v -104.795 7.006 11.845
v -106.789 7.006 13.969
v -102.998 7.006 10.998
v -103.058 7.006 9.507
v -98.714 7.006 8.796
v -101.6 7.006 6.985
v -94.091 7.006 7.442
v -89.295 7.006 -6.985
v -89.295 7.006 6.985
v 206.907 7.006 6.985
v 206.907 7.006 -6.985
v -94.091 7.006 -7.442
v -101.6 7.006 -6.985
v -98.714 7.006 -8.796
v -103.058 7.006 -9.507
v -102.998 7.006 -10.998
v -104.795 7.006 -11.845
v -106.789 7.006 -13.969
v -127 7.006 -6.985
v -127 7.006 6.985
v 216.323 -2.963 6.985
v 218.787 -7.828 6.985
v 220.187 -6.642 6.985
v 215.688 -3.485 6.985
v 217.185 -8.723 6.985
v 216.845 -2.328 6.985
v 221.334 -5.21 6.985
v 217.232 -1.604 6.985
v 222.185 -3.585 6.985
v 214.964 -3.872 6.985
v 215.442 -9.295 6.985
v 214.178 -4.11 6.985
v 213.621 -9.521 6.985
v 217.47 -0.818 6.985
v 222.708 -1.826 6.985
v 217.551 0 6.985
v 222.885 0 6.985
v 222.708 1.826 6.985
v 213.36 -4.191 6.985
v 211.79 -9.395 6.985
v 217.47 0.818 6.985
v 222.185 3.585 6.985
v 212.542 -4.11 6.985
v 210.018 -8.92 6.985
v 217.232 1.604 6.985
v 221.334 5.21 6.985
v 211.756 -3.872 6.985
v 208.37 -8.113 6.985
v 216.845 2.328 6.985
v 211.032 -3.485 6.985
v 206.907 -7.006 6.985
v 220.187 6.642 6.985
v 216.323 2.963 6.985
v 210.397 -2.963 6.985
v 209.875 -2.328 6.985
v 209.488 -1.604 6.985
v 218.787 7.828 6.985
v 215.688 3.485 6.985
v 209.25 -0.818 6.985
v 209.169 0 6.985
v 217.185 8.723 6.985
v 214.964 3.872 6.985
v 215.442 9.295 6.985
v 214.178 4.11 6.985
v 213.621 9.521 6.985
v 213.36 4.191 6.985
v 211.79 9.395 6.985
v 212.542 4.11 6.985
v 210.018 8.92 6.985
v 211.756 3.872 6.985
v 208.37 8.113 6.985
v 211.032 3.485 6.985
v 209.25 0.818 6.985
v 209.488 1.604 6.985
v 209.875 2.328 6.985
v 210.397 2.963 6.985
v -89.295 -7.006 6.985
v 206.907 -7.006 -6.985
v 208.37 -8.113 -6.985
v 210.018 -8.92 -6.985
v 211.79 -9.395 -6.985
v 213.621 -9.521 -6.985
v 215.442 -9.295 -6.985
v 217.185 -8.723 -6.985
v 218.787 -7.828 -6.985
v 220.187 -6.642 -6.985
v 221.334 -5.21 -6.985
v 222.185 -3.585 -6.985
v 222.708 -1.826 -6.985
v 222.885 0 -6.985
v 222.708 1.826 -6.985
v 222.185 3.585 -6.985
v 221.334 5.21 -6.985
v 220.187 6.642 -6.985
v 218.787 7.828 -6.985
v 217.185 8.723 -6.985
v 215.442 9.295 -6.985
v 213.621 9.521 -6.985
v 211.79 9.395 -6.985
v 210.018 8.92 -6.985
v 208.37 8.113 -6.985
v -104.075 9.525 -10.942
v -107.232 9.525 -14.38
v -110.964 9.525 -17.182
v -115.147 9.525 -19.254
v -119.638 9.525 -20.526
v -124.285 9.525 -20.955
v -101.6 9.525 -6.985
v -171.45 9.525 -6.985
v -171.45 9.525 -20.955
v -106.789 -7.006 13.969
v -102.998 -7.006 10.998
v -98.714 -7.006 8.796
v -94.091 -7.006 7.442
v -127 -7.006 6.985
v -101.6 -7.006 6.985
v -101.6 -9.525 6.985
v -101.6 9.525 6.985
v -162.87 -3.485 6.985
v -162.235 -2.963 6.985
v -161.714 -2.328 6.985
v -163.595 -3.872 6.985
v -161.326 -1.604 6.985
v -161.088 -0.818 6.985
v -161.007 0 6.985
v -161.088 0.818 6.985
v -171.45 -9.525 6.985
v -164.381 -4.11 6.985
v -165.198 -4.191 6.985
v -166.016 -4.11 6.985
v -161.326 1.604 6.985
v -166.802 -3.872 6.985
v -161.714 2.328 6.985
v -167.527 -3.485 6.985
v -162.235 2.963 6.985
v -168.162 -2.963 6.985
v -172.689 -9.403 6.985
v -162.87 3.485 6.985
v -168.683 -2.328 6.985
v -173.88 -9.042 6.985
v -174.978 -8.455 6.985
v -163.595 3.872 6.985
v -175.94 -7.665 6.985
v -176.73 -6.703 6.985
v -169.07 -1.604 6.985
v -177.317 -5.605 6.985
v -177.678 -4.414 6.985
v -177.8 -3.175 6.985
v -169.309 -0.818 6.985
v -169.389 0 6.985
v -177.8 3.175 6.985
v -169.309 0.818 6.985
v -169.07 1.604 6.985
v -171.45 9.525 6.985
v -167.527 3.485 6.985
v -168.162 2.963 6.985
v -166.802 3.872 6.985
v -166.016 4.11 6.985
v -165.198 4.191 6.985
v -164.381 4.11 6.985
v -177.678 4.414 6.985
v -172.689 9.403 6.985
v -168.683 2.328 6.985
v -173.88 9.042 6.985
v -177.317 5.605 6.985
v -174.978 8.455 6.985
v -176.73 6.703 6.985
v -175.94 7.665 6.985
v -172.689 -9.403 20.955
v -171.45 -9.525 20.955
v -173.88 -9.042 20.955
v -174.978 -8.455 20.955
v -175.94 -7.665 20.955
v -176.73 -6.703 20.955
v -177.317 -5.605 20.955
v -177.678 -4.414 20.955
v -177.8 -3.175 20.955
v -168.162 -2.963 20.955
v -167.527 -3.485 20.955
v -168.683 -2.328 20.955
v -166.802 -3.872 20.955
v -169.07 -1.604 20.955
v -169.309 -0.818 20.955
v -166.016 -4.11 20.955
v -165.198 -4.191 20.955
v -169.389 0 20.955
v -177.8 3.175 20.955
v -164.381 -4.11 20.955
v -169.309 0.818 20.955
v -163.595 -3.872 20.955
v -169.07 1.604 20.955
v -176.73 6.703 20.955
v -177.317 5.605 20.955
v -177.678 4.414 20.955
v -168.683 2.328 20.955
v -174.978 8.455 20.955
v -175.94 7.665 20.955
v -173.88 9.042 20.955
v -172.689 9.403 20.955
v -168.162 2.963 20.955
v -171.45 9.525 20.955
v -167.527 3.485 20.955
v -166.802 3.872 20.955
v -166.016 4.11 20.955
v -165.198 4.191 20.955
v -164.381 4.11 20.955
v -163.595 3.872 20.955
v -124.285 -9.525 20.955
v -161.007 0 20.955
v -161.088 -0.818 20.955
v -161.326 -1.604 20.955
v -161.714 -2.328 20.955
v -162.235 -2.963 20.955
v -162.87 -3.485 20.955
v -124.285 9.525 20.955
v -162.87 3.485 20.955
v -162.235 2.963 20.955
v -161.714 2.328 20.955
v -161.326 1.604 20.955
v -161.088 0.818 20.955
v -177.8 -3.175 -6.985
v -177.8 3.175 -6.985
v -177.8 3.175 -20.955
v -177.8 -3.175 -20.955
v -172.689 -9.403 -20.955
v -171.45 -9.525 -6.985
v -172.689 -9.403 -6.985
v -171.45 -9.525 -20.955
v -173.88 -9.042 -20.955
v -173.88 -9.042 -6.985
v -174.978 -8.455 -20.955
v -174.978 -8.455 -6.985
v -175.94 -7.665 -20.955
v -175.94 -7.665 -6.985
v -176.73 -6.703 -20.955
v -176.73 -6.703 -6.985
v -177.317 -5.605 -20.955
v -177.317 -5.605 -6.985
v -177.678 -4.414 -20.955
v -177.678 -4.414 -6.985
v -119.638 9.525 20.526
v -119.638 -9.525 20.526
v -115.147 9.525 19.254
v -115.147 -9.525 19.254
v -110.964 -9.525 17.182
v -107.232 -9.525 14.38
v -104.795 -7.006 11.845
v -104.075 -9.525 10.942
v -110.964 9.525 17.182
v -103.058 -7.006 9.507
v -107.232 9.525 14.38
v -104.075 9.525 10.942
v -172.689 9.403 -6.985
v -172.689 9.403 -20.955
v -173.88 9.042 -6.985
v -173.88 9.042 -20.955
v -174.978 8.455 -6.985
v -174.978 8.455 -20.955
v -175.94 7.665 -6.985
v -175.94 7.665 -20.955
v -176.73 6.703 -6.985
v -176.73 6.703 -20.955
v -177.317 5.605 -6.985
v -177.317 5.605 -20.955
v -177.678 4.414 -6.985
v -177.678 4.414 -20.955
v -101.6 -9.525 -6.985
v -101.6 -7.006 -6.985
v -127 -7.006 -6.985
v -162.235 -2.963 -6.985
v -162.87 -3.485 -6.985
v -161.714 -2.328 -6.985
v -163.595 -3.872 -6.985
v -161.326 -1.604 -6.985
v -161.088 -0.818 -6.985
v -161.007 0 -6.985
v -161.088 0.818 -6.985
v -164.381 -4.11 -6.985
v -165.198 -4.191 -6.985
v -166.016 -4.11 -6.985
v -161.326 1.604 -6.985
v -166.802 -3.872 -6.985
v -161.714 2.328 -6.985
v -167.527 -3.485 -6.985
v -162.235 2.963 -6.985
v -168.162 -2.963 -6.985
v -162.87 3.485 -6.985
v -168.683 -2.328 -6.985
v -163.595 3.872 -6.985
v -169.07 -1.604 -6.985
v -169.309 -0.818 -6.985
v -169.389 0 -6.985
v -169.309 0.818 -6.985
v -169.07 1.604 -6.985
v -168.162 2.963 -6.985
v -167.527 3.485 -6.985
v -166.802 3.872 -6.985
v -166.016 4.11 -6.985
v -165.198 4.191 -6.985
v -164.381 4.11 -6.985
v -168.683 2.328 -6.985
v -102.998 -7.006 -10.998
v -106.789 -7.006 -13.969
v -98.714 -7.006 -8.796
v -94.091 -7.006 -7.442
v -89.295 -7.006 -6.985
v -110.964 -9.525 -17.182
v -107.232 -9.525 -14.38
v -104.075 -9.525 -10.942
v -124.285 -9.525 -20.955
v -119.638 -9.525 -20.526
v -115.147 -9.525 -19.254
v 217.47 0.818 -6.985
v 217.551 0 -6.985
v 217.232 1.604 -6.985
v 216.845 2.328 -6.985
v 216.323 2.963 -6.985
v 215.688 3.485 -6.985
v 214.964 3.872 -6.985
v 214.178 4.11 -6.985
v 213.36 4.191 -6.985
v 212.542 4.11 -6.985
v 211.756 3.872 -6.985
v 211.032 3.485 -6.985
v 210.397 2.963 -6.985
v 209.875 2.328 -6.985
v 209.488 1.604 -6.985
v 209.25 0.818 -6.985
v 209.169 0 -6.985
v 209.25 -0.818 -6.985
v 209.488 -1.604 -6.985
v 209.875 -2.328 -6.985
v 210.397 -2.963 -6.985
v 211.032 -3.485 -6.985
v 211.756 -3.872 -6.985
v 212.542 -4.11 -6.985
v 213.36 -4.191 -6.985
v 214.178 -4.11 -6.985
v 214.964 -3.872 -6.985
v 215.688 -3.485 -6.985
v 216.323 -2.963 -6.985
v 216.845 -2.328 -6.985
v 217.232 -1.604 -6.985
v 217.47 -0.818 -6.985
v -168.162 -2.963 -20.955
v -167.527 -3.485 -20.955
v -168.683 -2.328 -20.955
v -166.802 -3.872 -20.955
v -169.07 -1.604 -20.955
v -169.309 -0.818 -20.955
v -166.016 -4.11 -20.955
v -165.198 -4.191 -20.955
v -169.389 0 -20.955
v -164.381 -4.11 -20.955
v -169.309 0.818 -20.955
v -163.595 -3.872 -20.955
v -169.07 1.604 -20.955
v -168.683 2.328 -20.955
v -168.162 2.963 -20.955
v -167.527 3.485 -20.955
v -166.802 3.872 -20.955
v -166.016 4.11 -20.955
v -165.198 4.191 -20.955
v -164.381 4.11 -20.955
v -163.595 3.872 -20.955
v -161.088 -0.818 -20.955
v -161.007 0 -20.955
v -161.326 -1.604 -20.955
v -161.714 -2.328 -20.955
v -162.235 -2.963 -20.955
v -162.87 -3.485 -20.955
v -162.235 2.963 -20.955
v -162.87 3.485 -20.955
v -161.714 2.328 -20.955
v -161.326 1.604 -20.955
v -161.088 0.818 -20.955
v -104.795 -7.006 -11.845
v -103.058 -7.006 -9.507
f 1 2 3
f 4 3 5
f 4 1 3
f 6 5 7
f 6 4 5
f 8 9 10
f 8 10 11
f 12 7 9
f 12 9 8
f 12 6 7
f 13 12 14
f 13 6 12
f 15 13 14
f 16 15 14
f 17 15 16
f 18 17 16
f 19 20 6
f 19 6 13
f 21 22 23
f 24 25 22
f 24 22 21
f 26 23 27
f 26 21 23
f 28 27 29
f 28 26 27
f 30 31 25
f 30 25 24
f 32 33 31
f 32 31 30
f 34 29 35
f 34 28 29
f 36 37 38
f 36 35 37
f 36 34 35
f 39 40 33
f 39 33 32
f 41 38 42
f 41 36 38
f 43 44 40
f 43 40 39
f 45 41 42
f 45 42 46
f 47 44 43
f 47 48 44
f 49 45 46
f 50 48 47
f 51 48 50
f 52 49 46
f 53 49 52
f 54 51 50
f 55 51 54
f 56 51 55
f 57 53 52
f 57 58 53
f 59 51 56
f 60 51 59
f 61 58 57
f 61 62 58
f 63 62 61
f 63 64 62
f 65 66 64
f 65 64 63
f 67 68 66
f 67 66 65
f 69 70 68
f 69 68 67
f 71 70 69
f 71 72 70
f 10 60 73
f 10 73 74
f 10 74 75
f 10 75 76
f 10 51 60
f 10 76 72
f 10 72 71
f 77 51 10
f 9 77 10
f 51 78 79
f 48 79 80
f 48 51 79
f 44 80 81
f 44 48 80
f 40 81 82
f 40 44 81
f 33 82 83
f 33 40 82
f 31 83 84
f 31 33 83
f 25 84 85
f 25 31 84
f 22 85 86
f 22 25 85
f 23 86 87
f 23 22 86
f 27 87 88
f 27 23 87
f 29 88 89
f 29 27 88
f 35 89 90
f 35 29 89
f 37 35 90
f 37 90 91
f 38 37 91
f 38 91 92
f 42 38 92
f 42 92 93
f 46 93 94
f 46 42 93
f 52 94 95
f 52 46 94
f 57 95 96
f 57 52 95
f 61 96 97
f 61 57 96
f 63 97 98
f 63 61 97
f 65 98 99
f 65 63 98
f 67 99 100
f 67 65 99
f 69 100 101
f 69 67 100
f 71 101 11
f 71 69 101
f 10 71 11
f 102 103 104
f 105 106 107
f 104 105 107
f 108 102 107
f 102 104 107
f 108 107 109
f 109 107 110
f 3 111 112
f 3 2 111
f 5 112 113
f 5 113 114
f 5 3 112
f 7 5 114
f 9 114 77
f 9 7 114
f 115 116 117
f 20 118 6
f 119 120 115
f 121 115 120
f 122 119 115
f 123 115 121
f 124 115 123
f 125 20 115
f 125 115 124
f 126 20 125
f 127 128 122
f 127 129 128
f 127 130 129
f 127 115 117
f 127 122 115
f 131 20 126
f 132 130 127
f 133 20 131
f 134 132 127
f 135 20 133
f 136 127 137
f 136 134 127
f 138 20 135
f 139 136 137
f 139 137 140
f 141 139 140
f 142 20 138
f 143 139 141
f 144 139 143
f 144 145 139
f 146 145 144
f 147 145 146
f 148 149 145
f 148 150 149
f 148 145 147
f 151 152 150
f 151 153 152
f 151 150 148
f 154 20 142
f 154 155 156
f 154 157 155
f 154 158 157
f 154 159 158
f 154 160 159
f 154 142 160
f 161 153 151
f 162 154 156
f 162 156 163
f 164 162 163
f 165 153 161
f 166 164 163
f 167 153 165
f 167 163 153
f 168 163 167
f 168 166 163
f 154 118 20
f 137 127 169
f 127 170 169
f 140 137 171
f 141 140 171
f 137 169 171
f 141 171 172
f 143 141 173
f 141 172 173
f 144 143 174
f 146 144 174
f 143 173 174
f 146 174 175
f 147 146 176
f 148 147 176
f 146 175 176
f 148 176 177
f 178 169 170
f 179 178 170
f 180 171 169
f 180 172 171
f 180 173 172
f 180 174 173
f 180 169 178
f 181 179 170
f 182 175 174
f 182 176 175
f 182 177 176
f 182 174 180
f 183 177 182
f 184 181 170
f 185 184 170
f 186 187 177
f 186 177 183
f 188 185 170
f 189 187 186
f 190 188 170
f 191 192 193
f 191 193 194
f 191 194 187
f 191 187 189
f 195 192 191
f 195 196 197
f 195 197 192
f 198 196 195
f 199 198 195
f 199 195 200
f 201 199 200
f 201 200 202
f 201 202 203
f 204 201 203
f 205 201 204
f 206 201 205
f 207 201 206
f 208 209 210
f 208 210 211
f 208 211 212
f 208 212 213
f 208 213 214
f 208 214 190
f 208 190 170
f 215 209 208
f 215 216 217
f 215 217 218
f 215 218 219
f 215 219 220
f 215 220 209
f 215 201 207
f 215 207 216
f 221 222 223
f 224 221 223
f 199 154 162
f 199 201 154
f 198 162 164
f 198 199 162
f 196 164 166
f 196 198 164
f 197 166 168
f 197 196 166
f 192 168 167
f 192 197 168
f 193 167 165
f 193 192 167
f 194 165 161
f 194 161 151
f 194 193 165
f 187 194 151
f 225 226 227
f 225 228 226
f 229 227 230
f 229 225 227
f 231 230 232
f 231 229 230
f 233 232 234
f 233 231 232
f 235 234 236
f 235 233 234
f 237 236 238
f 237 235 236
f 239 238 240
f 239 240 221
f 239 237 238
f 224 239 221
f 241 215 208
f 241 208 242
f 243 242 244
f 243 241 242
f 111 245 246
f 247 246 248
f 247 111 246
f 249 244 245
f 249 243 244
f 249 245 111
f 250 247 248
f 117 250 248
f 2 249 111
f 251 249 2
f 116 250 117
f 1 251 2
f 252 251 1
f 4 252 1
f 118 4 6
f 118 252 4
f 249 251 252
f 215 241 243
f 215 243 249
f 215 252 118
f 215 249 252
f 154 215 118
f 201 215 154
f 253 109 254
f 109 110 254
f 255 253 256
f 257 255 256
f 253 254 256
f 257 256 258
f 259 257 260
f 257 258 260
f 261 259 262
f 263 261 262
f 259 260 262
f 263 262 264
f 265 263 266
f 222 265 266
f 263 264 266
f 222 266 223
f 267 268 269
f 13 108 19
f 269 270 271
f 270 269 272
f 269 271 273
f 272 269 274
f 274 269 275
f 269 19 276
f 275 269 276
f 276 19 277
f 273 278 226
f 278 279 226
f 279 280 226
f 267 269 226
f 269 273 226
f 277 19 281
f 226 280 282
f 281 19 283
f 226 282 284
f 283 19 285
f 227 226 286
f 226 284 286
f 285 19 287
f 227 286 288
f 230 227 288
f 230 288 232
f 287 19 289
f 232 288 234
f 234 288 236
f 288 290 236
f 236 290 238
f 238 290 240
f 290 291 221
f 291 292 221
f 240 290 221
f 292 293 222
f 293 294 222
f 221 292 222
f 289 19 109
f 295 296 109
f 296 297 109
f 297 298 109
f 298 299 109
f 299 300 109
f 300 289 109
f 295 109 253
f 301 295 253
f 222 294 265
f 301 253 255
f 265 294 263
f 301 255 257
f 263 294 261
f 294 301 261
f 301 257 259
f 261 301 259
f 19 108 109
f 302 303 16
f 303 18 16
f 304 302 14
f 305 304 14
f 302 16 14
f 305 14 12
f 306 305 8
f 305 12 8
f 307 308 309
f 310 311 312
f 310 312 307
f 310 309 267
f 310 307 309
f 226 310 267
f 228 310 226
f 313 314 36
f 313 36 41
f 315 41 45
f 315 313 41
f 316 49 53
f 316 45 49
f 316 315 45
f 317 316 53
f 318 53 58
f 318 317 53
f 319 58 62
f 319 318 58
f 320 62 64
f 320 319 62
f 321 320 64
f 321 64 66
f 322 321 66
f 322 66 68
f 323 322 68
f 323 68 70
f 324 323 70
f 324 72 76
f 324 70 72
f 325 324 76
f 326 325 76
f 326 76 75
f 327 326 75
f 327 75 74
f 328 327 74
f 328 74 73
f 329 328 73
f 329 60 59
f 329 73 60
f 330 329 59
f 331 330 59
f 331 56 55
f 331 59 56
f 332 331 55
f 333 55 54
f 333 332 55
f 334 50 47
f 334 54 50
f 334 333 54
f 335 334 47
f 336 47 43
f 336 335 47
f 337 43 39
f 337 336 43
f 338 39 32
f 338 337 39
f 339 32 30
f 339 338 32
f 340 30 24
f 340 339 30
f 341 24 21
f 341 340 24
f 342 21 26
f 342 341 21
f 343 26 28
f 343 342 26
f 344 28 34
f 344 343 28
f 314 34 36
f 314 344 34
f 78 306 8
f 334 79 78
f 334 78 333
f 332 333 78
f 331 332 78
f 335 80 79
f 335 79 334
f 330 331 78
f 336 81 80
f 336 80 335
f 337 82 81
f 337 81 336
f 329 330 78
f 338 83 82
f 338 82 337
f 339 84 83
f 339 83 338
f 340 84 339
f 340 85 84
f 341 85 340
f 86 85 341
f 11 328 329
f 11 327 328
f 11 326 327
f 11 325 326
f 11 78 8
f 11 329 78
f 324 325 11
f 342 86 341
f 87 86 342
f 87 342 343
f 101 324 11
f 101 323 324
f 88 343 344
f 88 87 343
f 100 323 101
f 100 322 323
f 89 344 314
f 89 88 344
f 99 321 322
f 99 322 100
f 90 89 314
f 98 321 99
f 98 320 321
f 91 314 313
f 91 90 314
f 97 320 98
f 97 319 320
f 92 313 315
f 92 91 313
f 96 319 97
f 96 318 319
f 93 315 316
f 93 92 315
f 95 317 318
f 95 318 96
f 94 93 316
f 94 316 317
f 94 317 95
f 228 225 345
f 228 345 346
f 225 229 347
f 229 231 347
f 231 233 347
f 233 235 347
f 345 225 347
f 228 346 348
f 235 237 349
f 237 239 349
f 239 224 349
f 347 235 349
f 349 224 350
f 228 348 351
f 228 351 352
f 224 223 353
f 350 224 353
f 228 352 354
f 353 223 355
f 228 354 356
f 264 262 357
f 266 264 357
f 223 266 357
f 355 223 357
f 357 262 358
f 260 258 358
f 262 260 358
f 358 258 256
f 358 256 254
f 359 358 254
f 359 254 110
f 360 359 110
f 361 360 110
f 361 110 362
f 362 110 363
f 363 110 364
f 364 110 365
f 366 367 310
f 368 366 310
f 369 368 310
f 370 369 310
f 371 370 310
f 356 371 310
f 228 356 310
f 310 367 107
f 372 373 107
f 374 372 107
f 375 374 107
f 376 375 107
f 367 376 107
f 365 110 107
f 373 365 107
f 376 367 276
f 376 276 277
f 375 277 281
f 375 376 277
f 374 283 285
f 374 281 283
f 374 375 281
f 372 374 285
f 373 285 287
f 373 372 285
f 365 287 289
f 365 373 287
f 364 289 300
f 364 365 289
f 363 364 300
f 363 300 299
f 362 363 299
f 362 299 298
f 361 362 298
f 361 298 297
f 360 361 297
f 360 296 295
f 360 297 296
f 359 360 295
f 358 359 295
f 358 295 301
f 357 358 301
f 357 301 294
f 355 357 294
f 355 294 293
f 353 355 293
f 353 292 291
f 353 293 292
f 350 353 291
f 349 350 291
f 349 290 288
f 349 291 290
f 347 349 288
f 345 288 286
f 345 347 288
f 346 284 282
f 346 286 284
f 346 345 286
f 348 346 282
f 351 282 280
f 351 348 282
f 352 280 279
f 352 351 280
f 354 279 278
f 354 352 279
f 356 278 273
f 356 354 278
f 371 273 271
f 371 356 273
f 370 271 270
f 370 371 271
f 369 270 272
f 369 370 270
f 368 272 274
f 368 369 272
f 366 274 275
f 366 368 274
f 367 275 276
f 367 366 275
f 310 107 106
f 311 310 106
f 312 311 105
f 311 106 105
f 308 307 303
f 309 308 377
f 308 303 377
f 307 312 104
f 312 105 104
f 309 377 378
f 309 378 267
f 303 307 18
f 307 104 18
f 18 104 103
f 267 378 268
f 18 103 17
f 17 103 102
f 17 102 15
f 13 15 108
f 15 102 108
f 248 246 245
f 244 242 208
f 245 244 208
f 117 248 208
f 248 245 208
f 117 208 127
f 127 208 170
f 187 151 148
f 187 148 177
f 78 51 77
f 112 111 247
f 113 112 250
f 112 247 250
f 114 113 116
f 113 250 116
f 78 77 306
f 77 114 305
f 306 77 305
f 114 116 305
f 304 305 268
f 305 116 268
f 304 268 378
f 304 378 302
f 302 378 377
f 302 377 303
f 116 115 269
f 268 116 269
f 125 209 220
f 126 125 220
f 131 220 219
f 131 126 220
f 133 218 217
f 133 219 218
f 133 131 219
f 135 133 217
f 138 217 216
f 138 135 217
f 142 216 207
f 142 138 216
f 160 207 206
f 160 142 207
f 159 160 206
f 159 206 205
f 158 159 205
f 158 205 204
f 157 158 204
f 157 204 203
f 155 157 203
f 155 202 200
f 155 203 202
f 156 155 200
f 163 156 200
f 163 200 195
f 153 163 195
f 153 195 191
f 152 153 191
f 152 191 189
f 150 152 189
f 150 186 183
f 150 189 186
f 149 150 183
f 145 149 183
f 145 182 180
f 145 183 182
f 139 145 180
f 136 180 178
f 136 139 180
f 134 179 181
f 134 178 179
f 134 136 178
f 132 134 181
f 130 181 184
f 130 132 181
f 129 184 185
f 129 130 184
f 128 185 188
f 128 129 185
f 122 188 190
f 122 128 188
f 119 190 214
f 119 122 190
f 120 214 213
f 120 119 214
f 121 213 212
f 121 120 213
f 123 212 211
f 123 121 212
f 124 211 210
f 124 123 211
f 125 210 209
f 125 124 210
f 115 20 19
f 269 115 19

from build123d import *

# Parameters (mm, degrees)
BOSS_EXTRUDE1_DEPTH             = 213.36
BOSS_EXTRUDE1_DEPTH_BACK        = 127
SKETCH1_W                       = 13.97
SKETCH1_H                       = 14.012309452
BOSS_EXTRUDE2_REACH             = 215.589
SKETCH2_R                       = 9.525
BOSS_EXTRUDE2_DIRECTION_2_REACH = 215.589
CUT_EXTRUDE1_DEPTH              = 224.197757773
CUT_EXTRUDE1_DEPTH_BACK         = 224.197757773
SKETCH3_R                       = 4.191
BOSS_EXTRUDE3_DEPTH             = 9.525
FILLET1_R                       = 25.4
FILLET2_R                       = 25.4
FILLET5_R                       = 6.35
CUT_EXTRUDE4_DEPTH              = 225.070437307
CUT_EXTRUDE4_DEPTH_BACK         = 225.070437307
SKETCH10_R                      = 4.191


with BuildPart() as part:
    # Sketch1 → Boss-Extrude1 (new, two sides: drawn at the far end of the back side and taken through both)
    with BuildSketch(Plane(origin=(0, 0, 0), x_dir=(0, 0, -1), z_dir=(1, 0, 0)).offset(-BOSS_EXTRUDE1_DEPTH_BACK)):
        Rectangle(SKETCH1_W, SKETCH1_H)
    extrude(amount=BOSS_EXTRUDE1_DEPTH + BOSS_EXTRUDE1_DEPTH_BACK)

    # Boss-Extrude2: up to this face of the body (flat: up to its plane)
    boss_extrude2_end = Plane(part.part.faces().sort_by_distance((43.18, 0, 6.985))[0])
    # Sketch2 → Boss-Extrude2 (add, up to the picked face)
    with BuildSketch(Plane.XY, mode=Mode.PRIVATE) as boss_extrude2_sk1:
        with Locations((213.36, 0)):
            Circle(SKETCH2_R)
    boss_extrude2_tool1 = split(extrude(boss_extrude2_sk1.sketch, amount=BOSS_EXTRUDE2_REACH, mode=Mode.PRIVATE), bisect_by=boss_extrude2_end, keep=Keep.BOTH, mode=Mode.PRIVATE)
    add(boss_extrude2_tool1.solids().sort_by(Axis((213.36, 0, 0), (0, 0, 1)))[0])

    # Boss-Extrude2 direction 2: up to this face of the body (flat: up to its plane)
    boss_extrude2_direction_2_end = Plane(part.part.faces().sort_by_distance((43.18, 0, -6.985))[0])
    # Sketch2 → Boss-Extrude2 direction 2 (add, up to the picked face)
    with BuildSketch(Plane.XY, mode=Mode.PRIVATE) as boss_extrude2_direction_2_sk1:
        with Locations((213.36, 0)):
            Circle(SKETCH2_R)
    boss_extrude2_direction_2_tool1 = split(extrude(boss_extrude2_direction_2_sk1.sketch, amount=-BOSS_EXTRUDE2_DIRECTION_2_REACH, mode=Mode.PRIVATE), bisect_by=boss_extrude2_direction_2_end, keep=Keep.BOTH, mode=Mode.PRIVATE)
    add(boss_extrude2_direction_2_tool1.solids().sort_by(Axis((213.36, 0, 0), (0, 0, -1)))[0])

    # Sketch3 → Cut-Extrude1 (cut, two sides: drawn at the far end of the back side and taken through both)
    with BuildSketch(Plane.XY.offset(-CUT_EXTRUDE1_DEPTH_BACK)):
        with Locations((213.36, 0)):
            Circle(SKETCH3_R)
    extrude(amount=CUT_EXTRUDE1_DEPTH + CUT_EXTRUDE1_DEPTH_BACK, mode=Mode.SUBTRACT)

    # Sketch6 → Boss-Extrude3 (add, symmetric)
    with BuildSketch(Plane(origin=(0, 0, 0), x_dir=(1, 0, 0), z_dir=(0, 1, 0))):
        with BuildLine():
            Line((-127, 6.985), (-177.8, 6.985))
            Line((-177.8, 6.985), (-177.8, 20.955))
            Line((-177.8, 20.955), (-124.285401687, 20.955))
            ThreePointArc((-124.285401687, 20.955), (-110.964475014, 17.182372768), (-101.6, 6.985))
            Line((-101.6, 6.985), (-127, 6.985))
        make_face()
    boss_extrude3 = extrude(amount=BOSS_EXTRUDE3_DEPTH, both=True)

    # Fillet1
    fillet1_edges = [part.edges().sort_by_distance(p)[0] for p in [
        (-101.6, 0, -6.985),
    ]]
    fillet(fillet1_edges, radius=FILLET1_R)

    # Mirror3: Boss-Extrude3 across plane
    add(boss_extrude3.mirror(Plane.XY))

    # Fillet2
    fillet2_edges = [part.edges().sort_by_distance(p)[0] for p in [
        (-101.6, 0, 6.985),
    ]]
    fillet(fillet2_edges, radius=FILLET2_R)

    # Fillet5
    fillet5_edges = [part.edges().sort_by_distance(p)[0] for p in [
        (-177.8, -9.525, -13.97),
        (-177.8, 9.525, -13.97),
        (-177.8, 9.525, 13.97),
        (-177.8, -9.525, 13.97),
    ]]
    fillet(fillet5_edges, radius=FILLET5_R)

    # Sketch10 → Cut-Extrude4 (cut, two sides: drawn at the far end of the back side and taken through both)
    with BuildSketch(Plane.XY.offset(-CUT_EXTRUDE4_DEPTH_BACK)):
        with Locations((-165.198377534, 0)):
            Circle(SKETCH10_R)
    extrude(amount=CUT_EXTRUDE4_DEPTH + CUT_EXTRUDE4_DEPTH_BACK, mode=Mode.SUBTRACT)


solid = part.part
